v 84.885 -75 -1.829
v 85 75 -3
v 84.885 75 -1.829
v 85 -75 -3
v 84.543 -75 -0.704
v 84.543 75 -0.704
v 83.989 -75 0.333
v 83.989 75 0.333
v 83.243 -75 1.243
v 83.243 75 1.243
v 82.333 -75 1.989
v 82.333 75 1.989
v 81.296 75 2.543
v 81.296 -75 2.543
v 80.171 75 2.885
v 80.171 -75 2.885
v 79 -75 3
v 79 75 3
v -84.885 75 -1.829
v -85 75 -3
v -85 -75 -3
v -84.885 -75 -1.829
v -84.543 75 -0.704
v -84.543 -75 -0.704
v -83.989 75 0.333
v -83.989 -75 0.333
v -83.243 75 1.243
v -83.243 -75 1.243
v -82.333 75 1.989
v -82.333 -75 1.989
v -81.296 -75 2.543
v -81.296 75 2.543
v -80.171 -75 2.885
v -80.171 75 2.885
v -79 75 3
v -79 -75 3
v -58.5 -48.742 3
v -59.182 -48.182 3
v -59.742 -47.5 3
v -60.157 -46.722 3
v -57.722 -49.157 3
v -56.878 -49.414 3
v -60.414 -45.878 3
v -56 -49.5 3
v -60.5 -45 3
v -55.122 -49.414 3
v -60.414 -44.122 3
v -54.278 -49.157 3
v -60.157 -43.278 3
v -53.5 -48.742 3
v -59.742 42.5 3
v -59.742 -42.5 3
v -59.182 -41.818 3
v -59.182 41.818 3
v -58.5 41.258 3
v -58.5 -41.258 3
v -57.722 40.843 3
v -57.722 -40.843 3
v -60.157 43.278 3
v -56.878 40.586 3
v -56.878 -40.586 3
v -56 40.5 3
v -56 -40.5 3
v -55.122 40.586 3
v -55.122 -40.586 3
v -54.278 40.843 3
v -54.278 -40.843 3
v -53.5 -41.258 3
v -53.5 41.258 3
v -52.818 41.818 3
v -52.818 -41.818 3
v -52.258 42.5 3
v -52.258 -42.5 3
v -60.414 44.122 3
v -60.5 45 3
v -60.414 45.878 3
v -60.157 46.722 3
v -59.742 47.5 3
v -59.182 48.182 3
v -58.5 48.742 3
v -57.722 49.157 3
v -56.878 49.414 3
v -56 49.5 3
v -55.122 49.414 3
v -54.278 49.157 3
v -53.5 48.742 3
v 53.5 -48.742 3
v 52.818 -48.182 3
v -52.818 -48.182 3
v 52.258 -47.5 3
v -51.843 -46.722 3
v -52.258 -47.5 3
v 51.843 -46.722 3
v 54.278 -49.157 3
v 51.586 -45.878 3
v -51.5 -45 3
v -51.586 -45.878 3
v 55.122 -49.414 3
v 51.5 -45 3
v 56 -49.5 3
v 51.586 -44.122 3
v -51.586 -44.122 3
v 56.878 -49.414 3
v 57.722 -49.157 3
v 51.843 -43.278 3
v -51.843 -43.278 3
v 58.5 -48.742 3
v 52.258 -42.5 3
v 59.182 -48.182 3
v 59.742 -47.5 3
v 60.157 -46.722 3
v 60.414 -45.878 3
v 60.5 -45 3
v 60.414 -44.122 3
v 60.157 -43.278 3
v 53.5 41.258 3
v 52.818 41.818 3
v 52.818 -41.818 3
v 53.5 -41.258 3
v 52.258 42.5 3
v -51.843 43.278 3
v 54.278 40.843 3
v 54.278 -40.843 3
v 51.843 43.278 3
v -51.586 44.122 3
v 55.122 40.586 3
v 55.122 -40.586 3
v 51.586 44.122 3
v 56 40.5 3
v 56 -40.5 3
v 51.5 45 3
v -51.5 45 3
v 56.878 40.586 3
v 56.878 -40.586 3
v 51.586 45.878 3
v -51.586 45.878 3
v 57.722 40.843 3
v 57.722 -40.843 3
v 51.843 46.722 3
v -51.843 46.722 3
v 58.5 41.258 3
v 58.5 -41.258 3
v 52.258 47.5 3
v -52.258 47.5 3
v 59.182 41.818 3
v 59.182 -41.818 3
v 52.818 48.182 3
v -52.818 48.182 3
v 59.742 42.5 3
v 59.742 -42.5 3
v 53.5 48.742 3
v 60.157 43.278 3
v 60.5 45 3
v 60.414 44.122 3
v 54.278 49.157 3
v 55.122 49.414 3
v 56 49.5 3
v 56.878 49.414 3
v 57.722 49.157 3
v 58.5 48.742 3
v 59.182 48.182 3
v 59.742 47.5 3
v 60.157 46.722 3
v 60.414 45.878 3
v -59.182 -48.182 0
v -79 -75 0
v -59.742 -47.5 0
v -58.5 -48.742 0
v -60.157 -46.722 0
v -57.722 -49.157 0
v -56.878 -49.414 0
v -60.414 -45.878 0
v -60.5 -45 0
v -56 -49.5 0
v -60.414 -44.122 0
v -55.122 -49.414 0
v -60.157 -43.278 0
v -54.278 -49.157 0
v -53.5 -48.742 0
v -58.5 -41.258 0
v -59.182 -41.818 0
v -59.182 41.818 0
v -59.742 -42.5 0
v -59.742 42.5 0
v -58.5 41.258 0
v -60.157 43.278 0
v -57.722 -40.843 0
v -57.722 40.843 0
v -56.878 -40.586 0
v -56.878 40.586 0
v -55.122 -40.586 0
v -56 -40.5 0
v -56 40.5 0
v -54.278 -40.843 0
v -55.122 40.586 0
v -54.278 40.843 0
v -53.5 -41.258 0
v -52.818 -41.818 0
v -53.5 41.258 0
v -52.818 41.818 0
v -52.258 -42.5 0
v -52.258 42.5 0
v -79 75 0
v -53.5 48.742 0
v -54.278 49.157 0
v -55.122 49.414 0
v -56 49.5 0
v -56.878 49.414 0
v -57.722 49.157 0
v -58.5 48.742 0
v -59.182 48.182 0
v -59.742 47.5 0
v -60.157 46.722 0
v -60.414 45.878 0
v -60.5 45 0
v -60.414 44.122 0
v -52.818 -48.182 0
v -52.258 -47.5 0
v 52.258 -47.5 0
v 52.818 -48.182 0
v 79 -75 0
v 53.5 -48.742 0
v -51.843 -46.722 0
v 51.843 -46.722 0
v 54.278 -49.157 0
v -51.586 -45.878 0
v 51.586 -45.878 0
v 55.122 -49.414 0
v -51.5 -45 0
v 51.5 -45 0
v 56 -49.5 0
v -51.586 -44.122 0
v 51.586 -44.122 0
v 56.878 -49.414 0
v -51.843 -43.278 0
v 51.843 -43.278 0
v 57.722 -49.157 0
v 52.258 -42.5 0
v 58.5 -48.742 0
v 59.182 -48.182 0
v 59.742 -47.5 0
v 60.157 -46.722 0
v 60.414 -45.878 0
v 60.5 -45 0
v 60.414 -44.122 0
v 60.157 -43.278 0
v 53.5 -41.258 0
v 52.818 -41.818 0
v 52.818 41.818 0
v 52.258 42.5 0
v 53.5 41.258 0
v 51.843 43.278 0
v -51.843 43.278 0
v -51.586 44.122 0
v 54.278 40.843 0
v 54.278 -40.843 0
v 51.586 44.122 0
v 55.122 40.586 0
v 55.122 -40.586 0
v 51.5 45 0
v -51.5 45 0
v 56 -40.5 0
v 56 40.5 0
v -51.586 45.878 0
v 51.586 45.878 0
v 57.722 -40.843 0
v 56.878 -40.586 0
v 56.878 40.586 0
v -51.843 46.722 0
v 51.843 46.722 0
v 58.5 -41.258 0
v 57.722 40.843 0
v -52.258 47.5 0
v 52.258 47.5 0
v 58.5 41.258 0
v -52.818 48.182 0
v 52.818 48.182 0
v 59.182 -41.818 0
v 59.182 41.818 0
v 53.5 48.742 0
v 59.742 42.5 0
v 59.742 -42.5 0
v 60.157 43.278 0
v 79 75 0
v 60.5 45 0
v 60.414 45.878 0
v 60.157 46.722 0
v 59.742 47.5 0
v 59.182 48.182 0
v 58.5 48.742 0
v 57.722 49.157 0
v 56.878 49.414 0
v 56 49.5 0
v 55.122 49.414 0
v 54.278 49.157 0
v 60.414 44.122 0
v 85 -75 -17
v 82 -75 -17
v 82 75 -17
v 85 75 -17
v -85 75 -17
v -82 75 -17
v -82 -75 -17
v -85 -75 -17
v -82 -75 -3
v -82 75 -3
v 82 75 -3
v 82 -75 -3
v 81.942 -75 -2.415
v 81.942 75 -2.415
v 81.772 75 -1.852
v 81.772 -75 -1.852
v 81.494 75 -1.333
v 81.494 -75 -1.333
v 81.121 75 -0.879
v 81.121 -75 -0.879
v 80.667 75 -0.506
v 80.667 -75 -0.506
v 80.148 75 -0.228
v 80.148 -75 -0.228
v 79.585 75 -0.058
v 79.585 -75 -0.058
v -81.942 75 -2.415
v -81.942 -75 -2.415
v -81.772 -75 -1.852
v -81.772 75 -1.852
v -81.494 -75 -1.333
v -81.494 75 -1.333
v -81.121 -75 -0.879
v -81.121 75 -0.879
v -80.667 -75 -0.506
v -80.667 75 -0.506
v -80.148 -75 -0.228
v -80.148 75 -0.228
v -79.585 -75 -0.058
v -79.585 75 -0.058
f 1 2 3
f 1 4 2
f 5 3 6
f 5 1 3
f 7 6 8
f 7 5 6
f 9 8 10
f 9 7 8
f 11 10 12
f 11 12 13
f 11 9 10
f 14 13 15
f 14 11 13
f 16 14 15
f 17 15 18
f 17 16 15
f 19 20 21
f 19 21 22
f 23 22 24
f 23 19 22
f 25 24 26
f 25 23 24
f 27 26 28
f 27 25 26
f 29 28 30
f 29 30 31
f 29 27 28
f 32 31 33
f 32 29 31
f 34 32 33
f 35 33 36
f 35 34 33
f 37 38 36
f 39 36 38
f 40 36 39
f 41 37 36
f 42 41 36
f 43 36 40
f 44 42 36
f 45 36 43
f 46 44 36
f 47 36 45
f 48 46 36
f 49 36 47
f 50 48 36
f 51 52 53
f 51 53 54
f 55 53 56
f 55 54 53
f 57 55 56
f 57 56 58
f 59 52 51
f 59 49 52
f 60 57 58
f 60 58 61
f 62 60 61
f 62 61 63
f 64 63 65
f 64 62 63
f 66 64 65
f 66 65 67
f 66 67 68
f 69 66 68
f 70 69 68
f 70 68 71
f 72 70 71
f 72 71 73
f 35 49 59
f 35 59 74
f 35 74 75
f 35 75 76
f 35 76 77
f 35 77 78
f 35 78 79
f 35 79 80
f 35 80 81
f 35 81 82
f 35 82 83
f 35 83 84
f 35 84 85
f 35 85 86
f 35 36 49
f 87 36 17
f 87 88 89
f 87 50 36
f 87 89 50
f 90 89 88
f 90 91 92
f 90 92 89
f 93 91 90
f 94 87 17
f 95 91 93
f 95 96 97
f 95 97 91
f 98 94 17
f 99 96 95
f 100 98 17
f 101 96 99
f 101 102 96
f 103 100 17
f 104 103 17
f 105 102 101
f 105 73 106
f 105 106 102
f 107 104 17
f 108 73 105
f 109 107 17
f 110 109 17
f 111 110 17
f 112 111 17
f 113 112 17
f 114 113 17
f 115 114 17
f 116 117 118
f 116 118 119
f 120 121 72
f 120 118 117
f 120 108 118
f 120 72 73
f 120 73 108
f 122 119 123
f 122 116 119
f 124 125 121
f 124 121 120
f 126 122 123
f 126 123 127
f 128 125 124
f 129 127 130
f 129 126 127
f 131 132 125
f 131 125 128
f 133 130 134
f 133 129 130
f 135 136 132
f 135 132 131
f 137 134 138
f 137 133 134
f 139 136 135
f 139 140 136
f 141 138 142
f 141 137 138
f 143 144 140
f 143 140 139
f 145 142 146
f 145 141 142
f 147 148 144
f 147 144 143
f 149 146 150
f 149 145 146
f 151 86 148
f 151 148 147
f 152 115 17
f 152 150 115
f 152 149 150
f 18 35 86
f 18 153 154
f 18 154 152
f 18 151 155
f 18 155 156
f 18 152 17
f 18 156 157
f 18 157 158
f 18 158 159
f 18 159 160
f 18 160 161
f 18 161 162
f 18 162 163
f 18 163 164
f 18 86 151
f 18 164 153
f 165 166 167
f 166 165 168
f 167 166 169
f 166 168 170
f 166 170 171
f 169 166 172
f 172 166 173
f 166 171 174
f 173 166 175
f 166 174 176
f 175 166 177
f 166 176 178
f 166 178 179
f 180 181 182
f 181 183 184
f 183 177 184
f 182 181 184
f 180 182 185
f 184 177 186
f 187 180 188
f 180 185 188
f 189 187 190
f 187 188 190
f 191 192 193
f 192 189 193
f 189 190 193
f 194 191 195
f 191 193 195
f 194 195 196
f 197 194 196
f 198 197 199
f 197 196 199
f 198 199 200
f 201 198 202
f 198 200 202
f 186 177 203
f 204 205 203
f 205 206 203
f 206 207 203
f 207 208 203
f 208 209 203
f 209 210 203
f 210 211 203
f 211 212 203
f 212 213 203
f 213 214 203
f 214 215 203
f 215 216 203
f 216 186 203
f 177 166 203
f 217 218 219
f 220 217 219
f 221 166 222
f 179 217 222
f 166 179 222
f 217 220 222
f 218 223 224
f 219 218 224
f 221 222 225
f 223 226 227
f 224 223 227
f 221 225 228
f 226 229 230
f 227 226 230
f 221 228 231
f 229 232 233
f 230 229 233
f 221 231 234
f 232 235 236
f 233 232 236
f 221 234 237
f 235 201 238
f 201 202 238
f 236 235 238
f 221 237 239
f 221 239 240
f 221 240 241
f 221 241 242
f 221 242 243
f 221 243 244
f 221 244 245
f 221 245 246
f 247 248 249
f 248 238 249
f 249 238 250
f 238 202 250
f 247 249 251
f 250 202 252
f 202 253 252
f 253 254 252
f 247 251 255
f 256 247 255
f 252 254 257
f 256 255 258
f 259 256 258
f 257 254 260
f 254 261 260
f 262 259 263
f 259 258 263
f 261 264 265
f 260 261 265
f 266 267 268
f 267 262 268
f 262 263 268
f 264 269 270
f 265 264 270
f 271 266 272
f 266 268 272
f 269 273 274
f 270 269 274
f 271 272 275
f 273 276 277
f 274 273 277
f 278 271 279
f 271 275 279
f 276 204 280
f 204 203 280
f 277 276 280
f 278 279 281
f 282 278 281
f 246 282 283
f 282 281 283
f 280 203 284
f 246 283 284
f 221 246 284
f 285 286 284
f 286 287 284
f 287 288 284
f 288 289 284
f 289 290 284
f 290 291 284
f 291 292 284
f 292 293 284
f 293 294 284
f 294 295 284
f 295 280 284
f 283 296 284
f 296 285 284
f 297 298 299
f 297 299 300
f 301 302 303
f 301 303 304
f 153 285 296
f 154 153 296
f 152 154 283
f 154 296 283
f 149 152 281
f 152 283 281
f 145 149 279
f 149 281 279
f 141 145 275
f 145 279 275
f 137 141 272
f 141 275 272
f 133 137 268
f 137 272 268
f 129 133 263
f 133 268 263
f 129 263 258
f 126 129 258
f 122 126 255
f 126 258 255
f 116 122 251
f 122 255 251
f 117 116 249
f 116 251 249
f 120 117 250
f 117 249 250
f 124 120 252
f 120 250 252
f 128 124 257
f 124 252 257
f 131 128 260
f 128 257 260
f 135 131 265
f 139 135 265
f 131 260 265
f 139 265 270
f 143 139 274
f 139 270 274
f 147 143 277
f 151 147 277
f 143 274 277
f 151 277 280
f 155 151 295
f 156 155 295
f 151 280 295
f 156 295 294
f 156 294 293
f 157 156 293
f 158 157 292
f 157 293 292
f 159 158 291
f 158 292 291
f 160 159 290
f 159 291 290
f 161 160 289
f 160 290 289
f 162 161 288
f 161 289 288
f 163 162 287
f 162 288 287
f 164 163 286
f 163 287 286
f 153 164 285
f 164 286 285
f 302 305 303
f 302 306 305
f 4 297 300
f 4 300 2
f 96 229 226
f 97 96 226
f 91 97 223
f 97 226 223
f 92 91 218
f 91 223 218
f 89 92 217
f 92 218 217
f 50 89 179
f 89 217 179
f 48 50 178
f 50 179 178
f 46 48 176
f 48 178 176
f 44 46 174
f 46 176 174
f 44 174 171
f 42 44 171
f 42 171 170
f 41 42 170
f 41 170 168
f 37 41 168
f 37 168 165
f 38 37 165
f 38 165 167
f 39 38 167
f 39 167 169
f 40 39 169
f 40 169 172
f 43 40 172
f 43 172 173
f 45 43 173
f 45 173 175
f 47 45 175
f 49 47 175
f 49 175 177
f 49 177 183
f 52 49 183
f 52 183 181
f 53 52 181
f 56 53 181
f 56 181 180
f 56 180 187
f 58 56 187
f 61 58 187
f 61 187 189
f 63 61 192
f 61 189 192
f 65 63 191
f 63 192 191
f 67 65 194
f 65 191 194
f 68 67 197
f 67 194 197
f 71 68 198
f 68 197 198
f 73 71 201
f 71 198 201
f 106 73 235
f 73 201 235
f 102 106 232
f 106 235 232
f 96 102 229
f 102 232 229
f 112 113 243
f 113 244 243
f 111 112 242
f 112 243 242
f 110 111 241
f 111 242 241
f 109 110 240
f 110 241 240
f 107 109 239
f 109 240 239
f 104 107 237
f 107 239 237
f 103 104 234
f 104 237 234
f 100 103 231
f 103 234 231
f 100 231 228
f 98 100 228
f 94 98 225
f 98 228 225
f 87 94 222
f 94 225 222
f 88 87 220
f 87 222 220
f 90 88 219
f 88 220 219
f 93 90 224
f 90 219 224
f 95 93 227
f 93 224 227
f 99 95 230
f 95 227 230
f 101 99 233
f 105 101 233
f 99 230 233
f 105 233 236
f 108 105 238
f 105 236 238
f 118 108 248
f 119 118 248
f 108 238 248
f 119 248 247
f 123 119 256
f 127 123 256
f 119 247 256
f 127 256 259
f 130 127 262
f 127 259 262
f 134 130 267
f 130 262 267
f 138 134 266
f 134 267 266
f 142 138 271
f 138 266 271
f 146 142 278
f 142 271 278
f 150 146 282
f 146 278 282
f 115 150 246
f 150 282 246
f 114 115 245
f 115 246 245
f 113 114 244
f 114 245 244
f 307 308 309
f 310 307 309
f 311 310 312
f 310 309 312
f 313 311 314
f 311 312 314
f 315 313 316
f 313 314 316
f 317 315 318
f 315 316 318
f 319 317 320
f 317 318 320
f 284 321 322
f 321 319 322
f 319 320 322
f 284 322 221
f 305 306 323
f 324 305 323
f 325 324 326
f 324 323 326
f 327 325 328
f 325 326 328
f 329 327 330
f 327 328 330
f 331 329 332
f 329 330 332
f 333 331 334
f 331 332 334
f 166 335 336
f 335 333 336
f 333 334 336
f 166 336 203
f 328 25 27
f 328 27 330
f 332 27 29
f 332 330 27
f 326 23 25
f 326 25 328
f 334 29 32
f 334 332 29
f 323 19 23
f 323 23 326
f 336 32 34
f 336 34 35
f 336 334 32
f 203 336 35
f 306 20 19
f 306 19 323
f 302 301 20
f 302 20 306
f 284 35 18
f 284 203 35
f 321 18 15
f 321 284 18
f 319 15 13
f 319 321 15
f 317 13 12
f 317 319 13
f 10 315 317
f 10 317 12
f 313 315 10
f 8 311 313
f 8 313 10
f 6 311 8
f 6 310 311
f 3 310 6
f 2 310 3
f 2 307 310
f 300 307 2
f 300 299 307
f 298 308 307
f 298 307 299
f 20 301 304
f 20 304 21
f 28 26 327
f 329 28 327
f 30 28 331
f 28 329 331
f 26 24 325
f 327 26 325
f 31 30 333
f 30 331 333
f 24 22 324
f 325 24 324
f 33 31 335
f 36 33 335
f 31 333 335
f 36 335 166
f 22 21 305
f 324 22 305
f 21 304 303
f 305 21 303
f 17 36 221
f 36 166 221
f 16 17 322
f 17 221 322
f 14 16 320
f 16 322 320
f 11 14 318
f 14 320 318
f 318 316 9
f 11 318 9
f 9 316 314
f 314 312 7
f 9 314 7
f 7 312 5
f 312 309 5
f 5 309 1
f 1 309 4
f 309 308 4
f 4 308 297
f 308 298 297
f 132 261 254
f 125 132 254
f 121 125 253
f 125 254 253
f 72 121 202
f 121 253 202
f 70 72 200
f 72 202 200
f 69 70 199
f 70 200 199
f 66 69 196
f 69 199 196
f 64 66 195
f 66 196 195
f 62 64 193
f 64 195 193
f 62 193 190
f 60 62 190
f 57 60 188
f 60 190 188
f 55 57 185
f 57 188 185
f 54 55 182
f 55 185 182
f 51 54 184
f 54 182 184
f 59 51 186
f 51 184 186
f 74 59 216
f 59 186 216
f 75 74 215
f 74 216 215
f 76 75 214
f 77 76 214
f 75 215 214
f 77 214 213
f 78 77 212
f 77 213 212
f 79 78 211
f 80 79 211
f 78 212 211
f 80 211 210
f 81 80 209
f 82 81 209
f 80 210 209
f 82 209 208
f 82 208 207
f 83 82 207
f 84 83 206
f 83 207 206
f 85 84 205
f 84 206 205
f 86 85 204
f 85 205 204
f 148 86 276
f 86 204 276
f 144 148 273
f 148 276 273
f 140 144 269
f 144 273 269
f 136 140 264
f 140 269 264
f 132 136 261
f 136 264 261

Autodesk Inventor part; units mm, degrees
ref_plane "YZ Plane" through (0, 0, 0) normal (1, 0, 0) x (0, 1, 0)
ref_plane "XZ Plane" through (0, 0, 0) normal (0, 1, 0) x (-1, 0, 0)
ref_plane "XY Plane" through (0, 0, 0) normal (0, 0, 1) x (1, 0, 0)
sketch "Sketch1" plane through (0, 0, 0) normal (0, 0, 1) x (1, 0, 0)
  line L0 (85, -75) -> (-85, -75)
  line L1 (-85, -75) -> (-85, 75)
  line L2 (-85, 75) -> (85, 75)
  line L3 (85, 75) -> (85, -75)
  line L4 (85, 75) -> (-85, -75) construction
  point P0 (0, 0)
  point P1 (0, 0)
  dimension "d1" = 150
  dimension "d2" = 170
extrude "Plate1" add sketch "Sketch1" along normal blind 3
sketch "Sketch2" plane through (0, 0, 0) normal (0, 0, 1) x (1, 0, 0)
  line L0 (56, -45) -> (-56, -45) construction
  line L1 (-56, -45) -> (-56, 45) construction
  line L2 (-56, 45) -> (56, 45) construction
  line L3 (56, 45) -> (56, -45) construction
  line L4 (56, -45) -> (-56, 45) construction
  line L5 (-56, -45) -> (56, 45) construction
  circle A0 centre (-56, -45) radius 4.5
  circle A1 centre (56, -45) radius 4.5
  circle A2 centre (56, 45) radius 4.5
  circle A3 centre (-56, 45) radius 4.5
  line L6 (56, 0) -> (-56, 0) construction
  point P0 (0, 0)
  point P1 (0, 0)
  dimension "d4" = 112
  dimension "d5" = 90
  dimension "d7" = 9
extrude "Extrusion1" cut sketch "Sketch2" along normal through all
sketch "Sketch3" plane through (-82, 75, 3) normal (-1, 0, 0) x (0, -1, 0)
  line L0 (150, 0) -> (0, 0)
  line L1 (0, 0) -> (0, -20)
  line L2 (0, -20) -> (150, -20)
  line L3 (150, -20) -> (150, 0)
edge flange "Flange1" height 20 angle 90 thickness 3 bend radius 3 thickness toward (-1, 0, 0) relief tear relief width 3 relief depth 1.5 corner gap 3 corner form 0 edges at (-85, 0, 0) (85, 0, 0) wall of the first edge with corners at (-82, -75, 3) (-82, 75, 3) (-82, 75, -17) (-82, -75, -17)
bend "Bend1"
corner "Corner1"
sketch "Sketch4" plane through (0, 0, 0) normal (0, 0, 1) x (1, 0, 0)
  circle A0 centre (0, 75) radius 17.5 projected
  line L0 (0, 125) -> (0, 105) construction
  line L1 (-3, 125) -> (-3, 105)
  line L2 (3, 105) -> (3, 125)
  arc A1 (3, 125) -> (-3, 125) centre (0, 125) ccw
  arc A2 (-3, 105) -> (3, 105) centre (0, 105) ccw
  arc A3 (34.641, 95) -> (20, 109.641) centre (0, 75) ccw construction
  arc A4 (37.2391, 96.5) -> (21.5, 112.2391) centre (0, 75) ccw
  arc A5 (32.0429, 93.5) -> (18.5, 107.0429) centre (0, 75) ccw
  arc A6 (32.0429, 93.5) -> (37.2391, 96.5) centre (34.641, 95) ccw
  arc A7 (21.5, 112.2391) -> (18.5, 107.0429) centre (20, 109.641) ccw
  line L3 (0, 75) -> (20, 109.641) construction
  line L4 (0, 75) -> (40, 75) construction
  line L5 (0, 75) -> (34.641, 95) construction
  point P0 (0, 0)
  point P1 (0, 115)
  dimension "d20" = 20
  dimension "d21" = 6
  dimension "d22" = 30
  dimension "d23" = 60
  dimension "d24" = 30
  dimension "d25" = 6
  dimension "d26" = 40
extrude "Extrusion2" [suppressed]
pattern_circular "Circular Pattern1" [suppressed]
equation "\"d0\" = Thickness"
equation "\"d10\" = BendReliefWidth"
equation "\"d11\" = BendReliefDepth"
equation "\"d12\" = MinimumRemnant"
equation "\"d13\" = TransitionRadius"
equation "\"d16\" = BendRadius"
equation "\"d17\" = CornerReliefSize"
equation "\"d18\" = GapSize"
equation "\"d19\" = JacobiRadiusSize"
equation "\"BendRadius\" = Thickness"
equation "\"BendReliefWidth\" = Thickness"
equation "\"BendReliefDepth\" = 0.5 * Thickness"
equation "\"CornerReliefSize\" = 4 * Thickness"
equation "\"MinimumRemnant\" = 2 * Thickness"
equation "\"TransitionRadius\" = BendRadius"
equation "\"JacobiRadiusSize\" = BendRadius"
equation "\"GapSize\" = Thickness"
equation "\"Thickness\" = 3"
properties part number "GNH 026  Motor pillar 2" material "Stainless Steel"
